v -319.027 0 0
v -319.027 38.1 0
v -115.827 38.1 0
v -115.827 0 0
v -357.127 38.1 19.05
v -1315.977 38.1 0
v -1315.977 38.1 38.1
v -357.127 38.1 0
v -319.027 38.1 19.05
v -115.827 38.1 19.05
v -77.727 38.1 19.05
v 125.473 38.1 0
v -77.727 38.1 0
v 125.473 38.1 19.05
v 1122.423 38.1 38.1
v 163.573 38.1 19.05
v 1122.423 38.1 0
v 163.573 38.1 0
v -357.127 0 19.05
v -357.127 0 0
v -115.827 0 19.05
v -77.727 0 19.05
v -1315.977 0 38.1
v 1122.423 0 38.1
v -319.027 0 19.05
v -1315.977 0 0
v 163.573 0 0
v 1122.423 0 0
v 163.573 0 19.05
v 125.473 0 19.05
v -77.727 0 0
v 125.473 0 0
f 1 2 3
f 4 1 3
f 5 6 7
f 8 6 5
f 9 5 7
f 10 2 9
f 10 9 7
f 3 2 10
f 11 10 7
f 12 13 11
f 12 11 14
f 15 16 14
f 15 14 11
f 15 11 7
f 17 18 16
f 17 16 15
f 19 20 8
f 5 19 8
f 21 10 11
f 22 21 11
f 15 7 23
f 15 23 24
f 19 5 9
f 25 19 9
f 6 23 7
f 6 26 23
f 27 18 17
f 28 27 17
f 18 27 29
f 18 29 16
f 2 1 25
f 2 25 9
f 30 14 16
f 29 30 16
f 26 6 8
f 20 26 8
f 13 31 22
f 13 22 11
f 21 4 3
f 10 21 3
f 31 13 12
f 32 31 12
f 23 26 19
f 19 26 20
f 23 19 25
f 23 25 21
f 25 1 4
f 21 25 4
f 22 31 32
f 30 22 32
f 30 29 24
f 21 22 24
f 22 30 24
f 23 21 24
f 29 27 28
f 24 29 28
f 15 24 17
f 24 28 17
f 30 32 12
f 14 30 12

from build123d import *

# Parameters (mm, degrees)
F0_W     = 958.85
F0_H     = 38.1
F1_DEPTH = 19.05
F0_W_2   = 203.2
F2_W     = 2438.4
F2_H     = 38.1
F3_DEPTH = 19.05


with BuildPart() as f1:
    # F0 (on Top) → F1 (new body)
    with BuildSketch(Plane.XY):
        with Locations((-836.5519275119, 19.05)):
            Rectangle(F0_W, F0_H)
    extrude(amount=F1_DEPTH)



with BuildPart() as f1b:
    # F0 (on Top) → F1, piece 2 (new body)
    with BuildSketch(Plane.XY):
        with Locations((23.8730724881, 19.05)):
            Rectangle(F0_W_2, F0_H)
    extrude(amount=F1_DEPTH)


with BuildPart() as f1c:
    # F0 (on Top) → F1, piece 3 (new body)
    with BuildSketch(Plane.XY):
        with Locations((-217.4269275119, 19.05)):
            Rectangle(F0_W_2, F0_H)
    extrude(amount=F1_DEPTH)


with BuildPart() as f1d:
    # F0 (on Top) → F1, piece 4 (new body)
    with BuildSketch(Plane.XY):
        with Locations((642.9980724881, 19.05)):
            Rectangle(F0_W, F0_H)
    extrude(amount=F1_DEPTH)


with BuildPart() as f1_1:
    add(f1.part)

    add(f1b.part)  # F3 merges F1b

    add(f1c.part)  # F3 merges F1c

    add(f1d.part)  # F3 merges F1d
    # F2 (on face) → F3 (join)
    with BuildSketch(Plane.XY.offset(19.05)):
        with Locations((-96.7769275119, 19.05)):
            Rectangle(F2_W, F2_H)
    extrude(amount=F3_DEPTH)


solid = f1_1.part
